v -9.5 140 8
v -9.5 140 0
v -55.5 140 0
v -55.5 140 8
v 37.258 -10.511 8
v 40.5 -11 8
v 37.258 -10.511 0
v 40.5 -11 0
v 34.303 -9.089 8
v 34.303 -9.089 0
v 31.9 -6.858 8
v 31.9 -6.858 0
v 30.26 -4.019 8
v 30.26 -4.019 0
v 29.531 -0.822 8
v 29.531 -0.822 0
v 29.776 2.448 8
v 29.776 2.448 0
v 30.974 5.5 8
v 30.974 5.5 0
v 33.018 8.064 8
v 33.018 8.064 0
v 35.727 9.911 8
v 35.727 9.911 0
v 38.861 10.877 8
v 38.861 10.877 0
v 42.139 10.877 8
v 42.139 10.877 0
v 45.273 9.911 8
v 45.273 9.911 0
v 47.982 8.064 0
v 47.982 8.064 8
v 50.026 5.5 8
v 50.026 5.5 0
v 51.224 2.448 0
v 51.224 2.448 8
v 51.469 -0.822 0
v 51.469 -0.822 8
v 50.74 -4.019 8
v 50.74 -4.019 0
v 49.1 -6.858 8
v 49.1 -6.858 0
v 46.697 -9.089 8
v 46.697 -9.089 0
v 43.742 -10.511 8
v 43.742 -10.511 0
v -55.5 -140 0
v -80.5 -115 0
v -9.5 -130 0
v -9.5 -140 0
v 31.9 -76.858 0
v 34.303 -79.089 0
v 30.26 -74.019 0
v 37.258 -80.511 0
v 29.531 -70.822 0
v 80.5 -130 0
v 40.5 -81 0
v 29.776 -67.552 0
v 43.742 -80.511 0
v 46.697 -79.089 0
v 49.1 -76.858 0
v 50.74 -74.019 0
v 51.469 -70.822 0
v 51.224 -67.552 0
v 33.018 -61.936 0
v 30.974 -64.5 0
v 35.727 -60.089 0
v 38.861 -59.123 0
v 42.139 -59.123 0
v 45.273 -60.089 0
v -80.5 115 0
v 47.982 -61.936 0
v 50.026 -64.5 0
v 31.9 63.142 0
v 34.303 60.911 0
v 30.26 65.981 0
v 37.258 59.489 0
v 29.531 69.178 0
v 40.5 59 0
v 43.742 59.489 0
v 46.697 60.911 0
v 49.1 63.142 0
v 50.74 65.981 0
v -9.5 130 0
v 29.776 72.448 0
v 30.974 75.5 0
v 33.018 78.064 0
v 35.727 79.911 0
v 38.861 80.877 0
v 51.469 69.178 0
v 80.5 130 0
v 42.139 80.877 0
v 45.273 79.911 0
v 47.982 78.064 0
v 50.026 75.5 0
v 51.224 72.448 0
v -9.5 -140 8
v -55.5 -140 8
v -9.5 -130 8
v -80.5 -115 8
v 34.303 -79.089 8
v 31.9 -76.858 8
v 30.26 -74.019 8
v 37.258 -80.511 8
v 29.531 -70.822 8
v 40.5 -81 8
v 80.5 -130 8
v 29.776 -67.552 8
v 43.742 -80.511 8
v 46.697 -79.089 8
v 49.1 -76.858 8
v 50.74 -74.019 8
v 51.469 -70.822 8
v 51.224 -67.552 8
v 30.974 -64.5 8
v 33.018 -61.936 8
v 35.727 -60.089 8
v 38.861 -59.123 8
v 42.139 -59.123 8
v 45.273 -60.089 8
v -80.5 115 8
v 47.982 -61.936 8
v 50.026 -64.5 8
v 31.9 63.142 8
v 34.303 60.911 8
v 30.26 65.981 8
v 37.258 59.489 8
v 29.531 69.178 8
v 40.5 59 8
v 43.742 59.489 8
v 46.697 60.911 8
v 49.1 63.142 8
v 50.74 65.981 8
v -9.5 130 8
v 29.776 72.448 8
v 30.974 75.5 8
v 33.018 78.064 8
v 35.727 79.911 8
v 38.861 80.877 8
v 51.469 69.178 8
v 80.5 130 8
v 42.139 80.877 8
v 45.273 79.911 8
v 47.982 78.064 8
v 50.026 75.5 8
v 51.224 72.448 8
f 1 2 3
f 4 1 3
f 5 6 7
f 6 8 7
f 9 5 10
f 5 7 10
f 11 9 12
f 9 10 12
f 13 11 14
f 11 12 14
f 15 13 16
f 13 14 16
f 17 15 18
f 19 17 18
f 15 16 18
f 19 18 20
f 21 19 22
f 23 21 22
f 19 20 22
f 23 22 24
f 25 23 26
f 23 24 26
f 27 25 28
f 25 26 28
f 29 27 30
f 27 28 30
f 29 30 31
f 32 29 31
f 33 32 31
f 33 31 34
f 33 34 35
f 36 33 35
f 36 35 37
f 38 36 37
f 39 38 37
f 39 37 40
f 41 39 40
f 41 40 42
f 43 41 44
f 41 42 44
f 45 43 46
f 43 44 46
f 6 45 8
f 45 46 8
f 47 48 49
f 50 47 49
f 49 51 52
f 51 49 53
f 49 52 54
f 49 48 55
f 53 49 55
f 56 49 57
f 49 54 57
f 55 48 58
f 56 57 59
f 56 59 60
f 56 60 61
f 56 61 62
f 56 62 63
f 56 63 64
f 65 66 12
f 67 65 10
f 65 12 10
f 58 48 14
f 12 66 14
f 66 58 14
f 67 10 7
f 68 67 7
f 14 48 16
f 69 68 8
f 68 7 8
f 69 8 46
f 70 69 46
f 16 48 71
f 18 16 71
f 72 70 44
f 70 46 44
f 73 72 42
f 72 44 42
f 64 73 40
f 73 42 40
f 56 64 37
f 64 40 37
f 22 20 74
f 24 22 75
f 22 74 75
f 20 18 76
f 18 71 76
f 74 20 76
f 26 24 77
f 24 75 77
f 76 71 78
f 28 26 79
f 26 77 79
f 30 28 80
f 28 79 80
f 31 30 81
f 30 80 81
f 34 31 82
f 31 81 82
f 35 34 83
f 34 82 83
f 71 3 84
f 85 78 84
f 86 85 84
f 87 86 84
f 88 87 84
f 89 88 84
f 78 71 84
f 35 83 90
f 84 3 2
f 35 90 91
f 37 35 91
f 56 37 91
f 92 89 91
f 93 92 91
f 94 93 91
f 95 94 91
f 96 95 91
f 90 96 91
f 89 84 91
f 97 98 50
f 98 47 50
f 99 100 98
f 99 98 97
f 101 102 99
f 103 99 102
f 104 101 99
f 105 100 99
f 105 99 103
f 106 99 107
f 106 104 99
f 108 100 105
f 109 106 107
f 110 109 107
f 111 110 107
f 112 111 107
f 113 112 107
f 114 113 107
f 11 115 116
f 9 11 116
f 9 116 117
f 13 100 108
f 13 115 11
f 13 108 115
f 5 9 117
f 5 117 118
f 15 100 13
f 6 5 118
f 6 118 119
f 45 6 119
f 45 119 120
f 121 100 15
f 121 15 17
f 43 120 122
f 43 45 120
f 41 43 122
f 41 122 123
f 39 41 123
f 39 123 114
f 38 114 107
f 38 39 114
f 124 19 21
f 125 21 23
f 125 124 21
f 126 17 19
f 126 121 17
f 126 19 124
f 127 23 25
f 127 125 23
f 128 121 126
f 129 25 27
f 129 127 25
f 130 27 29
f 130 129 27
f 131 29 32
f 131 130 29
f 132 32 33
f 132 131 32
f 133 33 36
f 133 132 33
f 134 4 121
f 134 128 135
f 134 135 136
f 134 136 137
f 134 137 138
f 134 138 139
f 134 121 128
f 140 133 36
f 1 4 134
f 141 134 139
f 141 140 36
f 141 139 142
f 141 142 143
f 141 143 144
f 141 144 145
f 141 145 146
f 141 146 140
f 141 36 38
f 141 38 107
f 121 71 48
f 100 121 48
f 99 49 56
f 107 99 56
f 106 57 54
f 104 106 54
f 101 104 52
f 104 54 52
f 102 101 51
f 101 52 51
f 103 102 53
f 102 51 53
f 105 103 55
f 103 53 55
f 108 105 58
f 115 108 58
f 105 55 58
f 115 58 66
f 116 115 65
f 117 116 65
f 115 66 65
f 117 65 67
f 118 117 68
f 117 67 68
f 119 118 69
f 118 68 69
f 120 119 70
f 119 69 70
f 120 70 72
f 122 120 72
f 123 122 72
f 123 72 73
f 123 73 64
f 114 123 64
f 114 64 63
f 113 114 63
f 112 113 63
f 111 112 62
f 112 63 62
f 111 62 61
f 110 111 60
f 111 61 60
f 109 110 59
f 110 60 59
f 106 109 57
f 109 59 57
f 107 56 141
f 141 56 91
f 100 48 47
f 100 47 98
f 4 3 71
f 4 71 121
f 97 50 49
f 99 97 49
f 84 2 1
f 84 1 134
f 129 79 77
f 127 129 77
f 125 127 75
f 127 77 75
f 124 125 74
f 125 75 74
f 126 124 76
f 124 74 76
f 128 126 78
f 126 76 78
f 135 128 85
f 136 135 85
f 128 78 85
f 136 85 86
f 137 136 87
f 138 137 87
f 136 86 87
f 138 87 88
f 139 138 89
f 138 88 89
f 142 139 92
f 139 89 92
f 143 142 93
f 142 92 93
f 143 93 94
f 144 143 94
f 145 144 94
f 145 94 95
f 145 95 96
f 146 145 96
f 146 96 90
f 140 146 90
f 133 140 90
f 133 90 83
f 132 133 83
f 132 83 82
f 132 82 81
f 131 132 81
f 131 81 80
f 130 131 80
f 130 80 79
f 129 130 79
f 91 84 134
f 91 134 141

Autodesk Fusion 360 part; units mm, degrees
sketch "スケッチ1" plane through (0, 0, 0) normal (0, 0, 1) x (1, 0, 0)
  line L0 (-9.5, 140) -> (-80.5, 140)
  line L1 (-80.5, 140) -> (-80.5, -140)
  line L2 (-80.5, -140) -> (-9.5, -140)
  line L3 (80.5, -130) -> (80.5, 130)
  line L4 (74.75, 130) -> (-80.5, -140) construction
  line L5 (-80.5, 140) -> (74.75, -130) construction
  line L6 (-9.5, 140) -> (-9.5, 130)
  line L7 (-9.5, 130) -> (80.5, 130)
  line L8 (-9.5, -140) -> (-9.5, -130)
  line L9 (-9.5, -130) -> (80.5, -130)
  dimension "d2" = 280
extrude "押し出し1" add sketch "スケッチ1" along normal blind 8
chamfer "面取り1" distance 25 angle 45 2 edges at (-80.5, -140, 4) (-80.5, 140, 4)
sketch "スケッチ2" plane through (0, 0, 8) normal (0, 0, 1) x (-1, 0, 0)
  line L0 (55.5, -140) -> (80.5, -115)
  line L1 (80.5, -115) -> (80.5, 115)
  line L2 (80.5, 115) -> (55.5, 140)
  line L3 (55.5, 140) -> (9.5, 140)
  line L4 (9.5, 140) -> (9.5, 130)
  line L5 (9.5, 130) -> (-80.5, 130)
  line L6 (-80.5, 130) -> (-80.5, -130)
  line L7 (-80.5, -130) -> (9.5, -130)
  line L8 (9.5, -130) -> (9.5, -140)
  line L9 (9.5, -140) -> (55.5, -140)
  line L10 (-80.5, -130) -> (-40.5, -130) construction
  line L11 (-40.5, -130) -> (-40.5, -70) construction
  line L12 (-40.5, -70) -> (-80.5, -70) construction
  line L13 (-80.5, -70) -> (-80.5, -130) construction
  line L14 (-40.5, -70) -> (-40.5, 0) construction
  line L15 (-40.5, 0) -> (-40.5, 70) construction
  point P0 (-40.5, -70)
  point P1 (-40.5, 0)
  point P2 (-40.5, 70)
  dimension "d10" = 40
  dimension "d11" = 60
  dimension "d12" = 70
  dimension "d13" = 70
hole "穴1" at (40.5, 70, 8) at (40.5, 0, 8) at (40.5, -70, 8) direction (0, 0, -1) diameter 22 end through all
